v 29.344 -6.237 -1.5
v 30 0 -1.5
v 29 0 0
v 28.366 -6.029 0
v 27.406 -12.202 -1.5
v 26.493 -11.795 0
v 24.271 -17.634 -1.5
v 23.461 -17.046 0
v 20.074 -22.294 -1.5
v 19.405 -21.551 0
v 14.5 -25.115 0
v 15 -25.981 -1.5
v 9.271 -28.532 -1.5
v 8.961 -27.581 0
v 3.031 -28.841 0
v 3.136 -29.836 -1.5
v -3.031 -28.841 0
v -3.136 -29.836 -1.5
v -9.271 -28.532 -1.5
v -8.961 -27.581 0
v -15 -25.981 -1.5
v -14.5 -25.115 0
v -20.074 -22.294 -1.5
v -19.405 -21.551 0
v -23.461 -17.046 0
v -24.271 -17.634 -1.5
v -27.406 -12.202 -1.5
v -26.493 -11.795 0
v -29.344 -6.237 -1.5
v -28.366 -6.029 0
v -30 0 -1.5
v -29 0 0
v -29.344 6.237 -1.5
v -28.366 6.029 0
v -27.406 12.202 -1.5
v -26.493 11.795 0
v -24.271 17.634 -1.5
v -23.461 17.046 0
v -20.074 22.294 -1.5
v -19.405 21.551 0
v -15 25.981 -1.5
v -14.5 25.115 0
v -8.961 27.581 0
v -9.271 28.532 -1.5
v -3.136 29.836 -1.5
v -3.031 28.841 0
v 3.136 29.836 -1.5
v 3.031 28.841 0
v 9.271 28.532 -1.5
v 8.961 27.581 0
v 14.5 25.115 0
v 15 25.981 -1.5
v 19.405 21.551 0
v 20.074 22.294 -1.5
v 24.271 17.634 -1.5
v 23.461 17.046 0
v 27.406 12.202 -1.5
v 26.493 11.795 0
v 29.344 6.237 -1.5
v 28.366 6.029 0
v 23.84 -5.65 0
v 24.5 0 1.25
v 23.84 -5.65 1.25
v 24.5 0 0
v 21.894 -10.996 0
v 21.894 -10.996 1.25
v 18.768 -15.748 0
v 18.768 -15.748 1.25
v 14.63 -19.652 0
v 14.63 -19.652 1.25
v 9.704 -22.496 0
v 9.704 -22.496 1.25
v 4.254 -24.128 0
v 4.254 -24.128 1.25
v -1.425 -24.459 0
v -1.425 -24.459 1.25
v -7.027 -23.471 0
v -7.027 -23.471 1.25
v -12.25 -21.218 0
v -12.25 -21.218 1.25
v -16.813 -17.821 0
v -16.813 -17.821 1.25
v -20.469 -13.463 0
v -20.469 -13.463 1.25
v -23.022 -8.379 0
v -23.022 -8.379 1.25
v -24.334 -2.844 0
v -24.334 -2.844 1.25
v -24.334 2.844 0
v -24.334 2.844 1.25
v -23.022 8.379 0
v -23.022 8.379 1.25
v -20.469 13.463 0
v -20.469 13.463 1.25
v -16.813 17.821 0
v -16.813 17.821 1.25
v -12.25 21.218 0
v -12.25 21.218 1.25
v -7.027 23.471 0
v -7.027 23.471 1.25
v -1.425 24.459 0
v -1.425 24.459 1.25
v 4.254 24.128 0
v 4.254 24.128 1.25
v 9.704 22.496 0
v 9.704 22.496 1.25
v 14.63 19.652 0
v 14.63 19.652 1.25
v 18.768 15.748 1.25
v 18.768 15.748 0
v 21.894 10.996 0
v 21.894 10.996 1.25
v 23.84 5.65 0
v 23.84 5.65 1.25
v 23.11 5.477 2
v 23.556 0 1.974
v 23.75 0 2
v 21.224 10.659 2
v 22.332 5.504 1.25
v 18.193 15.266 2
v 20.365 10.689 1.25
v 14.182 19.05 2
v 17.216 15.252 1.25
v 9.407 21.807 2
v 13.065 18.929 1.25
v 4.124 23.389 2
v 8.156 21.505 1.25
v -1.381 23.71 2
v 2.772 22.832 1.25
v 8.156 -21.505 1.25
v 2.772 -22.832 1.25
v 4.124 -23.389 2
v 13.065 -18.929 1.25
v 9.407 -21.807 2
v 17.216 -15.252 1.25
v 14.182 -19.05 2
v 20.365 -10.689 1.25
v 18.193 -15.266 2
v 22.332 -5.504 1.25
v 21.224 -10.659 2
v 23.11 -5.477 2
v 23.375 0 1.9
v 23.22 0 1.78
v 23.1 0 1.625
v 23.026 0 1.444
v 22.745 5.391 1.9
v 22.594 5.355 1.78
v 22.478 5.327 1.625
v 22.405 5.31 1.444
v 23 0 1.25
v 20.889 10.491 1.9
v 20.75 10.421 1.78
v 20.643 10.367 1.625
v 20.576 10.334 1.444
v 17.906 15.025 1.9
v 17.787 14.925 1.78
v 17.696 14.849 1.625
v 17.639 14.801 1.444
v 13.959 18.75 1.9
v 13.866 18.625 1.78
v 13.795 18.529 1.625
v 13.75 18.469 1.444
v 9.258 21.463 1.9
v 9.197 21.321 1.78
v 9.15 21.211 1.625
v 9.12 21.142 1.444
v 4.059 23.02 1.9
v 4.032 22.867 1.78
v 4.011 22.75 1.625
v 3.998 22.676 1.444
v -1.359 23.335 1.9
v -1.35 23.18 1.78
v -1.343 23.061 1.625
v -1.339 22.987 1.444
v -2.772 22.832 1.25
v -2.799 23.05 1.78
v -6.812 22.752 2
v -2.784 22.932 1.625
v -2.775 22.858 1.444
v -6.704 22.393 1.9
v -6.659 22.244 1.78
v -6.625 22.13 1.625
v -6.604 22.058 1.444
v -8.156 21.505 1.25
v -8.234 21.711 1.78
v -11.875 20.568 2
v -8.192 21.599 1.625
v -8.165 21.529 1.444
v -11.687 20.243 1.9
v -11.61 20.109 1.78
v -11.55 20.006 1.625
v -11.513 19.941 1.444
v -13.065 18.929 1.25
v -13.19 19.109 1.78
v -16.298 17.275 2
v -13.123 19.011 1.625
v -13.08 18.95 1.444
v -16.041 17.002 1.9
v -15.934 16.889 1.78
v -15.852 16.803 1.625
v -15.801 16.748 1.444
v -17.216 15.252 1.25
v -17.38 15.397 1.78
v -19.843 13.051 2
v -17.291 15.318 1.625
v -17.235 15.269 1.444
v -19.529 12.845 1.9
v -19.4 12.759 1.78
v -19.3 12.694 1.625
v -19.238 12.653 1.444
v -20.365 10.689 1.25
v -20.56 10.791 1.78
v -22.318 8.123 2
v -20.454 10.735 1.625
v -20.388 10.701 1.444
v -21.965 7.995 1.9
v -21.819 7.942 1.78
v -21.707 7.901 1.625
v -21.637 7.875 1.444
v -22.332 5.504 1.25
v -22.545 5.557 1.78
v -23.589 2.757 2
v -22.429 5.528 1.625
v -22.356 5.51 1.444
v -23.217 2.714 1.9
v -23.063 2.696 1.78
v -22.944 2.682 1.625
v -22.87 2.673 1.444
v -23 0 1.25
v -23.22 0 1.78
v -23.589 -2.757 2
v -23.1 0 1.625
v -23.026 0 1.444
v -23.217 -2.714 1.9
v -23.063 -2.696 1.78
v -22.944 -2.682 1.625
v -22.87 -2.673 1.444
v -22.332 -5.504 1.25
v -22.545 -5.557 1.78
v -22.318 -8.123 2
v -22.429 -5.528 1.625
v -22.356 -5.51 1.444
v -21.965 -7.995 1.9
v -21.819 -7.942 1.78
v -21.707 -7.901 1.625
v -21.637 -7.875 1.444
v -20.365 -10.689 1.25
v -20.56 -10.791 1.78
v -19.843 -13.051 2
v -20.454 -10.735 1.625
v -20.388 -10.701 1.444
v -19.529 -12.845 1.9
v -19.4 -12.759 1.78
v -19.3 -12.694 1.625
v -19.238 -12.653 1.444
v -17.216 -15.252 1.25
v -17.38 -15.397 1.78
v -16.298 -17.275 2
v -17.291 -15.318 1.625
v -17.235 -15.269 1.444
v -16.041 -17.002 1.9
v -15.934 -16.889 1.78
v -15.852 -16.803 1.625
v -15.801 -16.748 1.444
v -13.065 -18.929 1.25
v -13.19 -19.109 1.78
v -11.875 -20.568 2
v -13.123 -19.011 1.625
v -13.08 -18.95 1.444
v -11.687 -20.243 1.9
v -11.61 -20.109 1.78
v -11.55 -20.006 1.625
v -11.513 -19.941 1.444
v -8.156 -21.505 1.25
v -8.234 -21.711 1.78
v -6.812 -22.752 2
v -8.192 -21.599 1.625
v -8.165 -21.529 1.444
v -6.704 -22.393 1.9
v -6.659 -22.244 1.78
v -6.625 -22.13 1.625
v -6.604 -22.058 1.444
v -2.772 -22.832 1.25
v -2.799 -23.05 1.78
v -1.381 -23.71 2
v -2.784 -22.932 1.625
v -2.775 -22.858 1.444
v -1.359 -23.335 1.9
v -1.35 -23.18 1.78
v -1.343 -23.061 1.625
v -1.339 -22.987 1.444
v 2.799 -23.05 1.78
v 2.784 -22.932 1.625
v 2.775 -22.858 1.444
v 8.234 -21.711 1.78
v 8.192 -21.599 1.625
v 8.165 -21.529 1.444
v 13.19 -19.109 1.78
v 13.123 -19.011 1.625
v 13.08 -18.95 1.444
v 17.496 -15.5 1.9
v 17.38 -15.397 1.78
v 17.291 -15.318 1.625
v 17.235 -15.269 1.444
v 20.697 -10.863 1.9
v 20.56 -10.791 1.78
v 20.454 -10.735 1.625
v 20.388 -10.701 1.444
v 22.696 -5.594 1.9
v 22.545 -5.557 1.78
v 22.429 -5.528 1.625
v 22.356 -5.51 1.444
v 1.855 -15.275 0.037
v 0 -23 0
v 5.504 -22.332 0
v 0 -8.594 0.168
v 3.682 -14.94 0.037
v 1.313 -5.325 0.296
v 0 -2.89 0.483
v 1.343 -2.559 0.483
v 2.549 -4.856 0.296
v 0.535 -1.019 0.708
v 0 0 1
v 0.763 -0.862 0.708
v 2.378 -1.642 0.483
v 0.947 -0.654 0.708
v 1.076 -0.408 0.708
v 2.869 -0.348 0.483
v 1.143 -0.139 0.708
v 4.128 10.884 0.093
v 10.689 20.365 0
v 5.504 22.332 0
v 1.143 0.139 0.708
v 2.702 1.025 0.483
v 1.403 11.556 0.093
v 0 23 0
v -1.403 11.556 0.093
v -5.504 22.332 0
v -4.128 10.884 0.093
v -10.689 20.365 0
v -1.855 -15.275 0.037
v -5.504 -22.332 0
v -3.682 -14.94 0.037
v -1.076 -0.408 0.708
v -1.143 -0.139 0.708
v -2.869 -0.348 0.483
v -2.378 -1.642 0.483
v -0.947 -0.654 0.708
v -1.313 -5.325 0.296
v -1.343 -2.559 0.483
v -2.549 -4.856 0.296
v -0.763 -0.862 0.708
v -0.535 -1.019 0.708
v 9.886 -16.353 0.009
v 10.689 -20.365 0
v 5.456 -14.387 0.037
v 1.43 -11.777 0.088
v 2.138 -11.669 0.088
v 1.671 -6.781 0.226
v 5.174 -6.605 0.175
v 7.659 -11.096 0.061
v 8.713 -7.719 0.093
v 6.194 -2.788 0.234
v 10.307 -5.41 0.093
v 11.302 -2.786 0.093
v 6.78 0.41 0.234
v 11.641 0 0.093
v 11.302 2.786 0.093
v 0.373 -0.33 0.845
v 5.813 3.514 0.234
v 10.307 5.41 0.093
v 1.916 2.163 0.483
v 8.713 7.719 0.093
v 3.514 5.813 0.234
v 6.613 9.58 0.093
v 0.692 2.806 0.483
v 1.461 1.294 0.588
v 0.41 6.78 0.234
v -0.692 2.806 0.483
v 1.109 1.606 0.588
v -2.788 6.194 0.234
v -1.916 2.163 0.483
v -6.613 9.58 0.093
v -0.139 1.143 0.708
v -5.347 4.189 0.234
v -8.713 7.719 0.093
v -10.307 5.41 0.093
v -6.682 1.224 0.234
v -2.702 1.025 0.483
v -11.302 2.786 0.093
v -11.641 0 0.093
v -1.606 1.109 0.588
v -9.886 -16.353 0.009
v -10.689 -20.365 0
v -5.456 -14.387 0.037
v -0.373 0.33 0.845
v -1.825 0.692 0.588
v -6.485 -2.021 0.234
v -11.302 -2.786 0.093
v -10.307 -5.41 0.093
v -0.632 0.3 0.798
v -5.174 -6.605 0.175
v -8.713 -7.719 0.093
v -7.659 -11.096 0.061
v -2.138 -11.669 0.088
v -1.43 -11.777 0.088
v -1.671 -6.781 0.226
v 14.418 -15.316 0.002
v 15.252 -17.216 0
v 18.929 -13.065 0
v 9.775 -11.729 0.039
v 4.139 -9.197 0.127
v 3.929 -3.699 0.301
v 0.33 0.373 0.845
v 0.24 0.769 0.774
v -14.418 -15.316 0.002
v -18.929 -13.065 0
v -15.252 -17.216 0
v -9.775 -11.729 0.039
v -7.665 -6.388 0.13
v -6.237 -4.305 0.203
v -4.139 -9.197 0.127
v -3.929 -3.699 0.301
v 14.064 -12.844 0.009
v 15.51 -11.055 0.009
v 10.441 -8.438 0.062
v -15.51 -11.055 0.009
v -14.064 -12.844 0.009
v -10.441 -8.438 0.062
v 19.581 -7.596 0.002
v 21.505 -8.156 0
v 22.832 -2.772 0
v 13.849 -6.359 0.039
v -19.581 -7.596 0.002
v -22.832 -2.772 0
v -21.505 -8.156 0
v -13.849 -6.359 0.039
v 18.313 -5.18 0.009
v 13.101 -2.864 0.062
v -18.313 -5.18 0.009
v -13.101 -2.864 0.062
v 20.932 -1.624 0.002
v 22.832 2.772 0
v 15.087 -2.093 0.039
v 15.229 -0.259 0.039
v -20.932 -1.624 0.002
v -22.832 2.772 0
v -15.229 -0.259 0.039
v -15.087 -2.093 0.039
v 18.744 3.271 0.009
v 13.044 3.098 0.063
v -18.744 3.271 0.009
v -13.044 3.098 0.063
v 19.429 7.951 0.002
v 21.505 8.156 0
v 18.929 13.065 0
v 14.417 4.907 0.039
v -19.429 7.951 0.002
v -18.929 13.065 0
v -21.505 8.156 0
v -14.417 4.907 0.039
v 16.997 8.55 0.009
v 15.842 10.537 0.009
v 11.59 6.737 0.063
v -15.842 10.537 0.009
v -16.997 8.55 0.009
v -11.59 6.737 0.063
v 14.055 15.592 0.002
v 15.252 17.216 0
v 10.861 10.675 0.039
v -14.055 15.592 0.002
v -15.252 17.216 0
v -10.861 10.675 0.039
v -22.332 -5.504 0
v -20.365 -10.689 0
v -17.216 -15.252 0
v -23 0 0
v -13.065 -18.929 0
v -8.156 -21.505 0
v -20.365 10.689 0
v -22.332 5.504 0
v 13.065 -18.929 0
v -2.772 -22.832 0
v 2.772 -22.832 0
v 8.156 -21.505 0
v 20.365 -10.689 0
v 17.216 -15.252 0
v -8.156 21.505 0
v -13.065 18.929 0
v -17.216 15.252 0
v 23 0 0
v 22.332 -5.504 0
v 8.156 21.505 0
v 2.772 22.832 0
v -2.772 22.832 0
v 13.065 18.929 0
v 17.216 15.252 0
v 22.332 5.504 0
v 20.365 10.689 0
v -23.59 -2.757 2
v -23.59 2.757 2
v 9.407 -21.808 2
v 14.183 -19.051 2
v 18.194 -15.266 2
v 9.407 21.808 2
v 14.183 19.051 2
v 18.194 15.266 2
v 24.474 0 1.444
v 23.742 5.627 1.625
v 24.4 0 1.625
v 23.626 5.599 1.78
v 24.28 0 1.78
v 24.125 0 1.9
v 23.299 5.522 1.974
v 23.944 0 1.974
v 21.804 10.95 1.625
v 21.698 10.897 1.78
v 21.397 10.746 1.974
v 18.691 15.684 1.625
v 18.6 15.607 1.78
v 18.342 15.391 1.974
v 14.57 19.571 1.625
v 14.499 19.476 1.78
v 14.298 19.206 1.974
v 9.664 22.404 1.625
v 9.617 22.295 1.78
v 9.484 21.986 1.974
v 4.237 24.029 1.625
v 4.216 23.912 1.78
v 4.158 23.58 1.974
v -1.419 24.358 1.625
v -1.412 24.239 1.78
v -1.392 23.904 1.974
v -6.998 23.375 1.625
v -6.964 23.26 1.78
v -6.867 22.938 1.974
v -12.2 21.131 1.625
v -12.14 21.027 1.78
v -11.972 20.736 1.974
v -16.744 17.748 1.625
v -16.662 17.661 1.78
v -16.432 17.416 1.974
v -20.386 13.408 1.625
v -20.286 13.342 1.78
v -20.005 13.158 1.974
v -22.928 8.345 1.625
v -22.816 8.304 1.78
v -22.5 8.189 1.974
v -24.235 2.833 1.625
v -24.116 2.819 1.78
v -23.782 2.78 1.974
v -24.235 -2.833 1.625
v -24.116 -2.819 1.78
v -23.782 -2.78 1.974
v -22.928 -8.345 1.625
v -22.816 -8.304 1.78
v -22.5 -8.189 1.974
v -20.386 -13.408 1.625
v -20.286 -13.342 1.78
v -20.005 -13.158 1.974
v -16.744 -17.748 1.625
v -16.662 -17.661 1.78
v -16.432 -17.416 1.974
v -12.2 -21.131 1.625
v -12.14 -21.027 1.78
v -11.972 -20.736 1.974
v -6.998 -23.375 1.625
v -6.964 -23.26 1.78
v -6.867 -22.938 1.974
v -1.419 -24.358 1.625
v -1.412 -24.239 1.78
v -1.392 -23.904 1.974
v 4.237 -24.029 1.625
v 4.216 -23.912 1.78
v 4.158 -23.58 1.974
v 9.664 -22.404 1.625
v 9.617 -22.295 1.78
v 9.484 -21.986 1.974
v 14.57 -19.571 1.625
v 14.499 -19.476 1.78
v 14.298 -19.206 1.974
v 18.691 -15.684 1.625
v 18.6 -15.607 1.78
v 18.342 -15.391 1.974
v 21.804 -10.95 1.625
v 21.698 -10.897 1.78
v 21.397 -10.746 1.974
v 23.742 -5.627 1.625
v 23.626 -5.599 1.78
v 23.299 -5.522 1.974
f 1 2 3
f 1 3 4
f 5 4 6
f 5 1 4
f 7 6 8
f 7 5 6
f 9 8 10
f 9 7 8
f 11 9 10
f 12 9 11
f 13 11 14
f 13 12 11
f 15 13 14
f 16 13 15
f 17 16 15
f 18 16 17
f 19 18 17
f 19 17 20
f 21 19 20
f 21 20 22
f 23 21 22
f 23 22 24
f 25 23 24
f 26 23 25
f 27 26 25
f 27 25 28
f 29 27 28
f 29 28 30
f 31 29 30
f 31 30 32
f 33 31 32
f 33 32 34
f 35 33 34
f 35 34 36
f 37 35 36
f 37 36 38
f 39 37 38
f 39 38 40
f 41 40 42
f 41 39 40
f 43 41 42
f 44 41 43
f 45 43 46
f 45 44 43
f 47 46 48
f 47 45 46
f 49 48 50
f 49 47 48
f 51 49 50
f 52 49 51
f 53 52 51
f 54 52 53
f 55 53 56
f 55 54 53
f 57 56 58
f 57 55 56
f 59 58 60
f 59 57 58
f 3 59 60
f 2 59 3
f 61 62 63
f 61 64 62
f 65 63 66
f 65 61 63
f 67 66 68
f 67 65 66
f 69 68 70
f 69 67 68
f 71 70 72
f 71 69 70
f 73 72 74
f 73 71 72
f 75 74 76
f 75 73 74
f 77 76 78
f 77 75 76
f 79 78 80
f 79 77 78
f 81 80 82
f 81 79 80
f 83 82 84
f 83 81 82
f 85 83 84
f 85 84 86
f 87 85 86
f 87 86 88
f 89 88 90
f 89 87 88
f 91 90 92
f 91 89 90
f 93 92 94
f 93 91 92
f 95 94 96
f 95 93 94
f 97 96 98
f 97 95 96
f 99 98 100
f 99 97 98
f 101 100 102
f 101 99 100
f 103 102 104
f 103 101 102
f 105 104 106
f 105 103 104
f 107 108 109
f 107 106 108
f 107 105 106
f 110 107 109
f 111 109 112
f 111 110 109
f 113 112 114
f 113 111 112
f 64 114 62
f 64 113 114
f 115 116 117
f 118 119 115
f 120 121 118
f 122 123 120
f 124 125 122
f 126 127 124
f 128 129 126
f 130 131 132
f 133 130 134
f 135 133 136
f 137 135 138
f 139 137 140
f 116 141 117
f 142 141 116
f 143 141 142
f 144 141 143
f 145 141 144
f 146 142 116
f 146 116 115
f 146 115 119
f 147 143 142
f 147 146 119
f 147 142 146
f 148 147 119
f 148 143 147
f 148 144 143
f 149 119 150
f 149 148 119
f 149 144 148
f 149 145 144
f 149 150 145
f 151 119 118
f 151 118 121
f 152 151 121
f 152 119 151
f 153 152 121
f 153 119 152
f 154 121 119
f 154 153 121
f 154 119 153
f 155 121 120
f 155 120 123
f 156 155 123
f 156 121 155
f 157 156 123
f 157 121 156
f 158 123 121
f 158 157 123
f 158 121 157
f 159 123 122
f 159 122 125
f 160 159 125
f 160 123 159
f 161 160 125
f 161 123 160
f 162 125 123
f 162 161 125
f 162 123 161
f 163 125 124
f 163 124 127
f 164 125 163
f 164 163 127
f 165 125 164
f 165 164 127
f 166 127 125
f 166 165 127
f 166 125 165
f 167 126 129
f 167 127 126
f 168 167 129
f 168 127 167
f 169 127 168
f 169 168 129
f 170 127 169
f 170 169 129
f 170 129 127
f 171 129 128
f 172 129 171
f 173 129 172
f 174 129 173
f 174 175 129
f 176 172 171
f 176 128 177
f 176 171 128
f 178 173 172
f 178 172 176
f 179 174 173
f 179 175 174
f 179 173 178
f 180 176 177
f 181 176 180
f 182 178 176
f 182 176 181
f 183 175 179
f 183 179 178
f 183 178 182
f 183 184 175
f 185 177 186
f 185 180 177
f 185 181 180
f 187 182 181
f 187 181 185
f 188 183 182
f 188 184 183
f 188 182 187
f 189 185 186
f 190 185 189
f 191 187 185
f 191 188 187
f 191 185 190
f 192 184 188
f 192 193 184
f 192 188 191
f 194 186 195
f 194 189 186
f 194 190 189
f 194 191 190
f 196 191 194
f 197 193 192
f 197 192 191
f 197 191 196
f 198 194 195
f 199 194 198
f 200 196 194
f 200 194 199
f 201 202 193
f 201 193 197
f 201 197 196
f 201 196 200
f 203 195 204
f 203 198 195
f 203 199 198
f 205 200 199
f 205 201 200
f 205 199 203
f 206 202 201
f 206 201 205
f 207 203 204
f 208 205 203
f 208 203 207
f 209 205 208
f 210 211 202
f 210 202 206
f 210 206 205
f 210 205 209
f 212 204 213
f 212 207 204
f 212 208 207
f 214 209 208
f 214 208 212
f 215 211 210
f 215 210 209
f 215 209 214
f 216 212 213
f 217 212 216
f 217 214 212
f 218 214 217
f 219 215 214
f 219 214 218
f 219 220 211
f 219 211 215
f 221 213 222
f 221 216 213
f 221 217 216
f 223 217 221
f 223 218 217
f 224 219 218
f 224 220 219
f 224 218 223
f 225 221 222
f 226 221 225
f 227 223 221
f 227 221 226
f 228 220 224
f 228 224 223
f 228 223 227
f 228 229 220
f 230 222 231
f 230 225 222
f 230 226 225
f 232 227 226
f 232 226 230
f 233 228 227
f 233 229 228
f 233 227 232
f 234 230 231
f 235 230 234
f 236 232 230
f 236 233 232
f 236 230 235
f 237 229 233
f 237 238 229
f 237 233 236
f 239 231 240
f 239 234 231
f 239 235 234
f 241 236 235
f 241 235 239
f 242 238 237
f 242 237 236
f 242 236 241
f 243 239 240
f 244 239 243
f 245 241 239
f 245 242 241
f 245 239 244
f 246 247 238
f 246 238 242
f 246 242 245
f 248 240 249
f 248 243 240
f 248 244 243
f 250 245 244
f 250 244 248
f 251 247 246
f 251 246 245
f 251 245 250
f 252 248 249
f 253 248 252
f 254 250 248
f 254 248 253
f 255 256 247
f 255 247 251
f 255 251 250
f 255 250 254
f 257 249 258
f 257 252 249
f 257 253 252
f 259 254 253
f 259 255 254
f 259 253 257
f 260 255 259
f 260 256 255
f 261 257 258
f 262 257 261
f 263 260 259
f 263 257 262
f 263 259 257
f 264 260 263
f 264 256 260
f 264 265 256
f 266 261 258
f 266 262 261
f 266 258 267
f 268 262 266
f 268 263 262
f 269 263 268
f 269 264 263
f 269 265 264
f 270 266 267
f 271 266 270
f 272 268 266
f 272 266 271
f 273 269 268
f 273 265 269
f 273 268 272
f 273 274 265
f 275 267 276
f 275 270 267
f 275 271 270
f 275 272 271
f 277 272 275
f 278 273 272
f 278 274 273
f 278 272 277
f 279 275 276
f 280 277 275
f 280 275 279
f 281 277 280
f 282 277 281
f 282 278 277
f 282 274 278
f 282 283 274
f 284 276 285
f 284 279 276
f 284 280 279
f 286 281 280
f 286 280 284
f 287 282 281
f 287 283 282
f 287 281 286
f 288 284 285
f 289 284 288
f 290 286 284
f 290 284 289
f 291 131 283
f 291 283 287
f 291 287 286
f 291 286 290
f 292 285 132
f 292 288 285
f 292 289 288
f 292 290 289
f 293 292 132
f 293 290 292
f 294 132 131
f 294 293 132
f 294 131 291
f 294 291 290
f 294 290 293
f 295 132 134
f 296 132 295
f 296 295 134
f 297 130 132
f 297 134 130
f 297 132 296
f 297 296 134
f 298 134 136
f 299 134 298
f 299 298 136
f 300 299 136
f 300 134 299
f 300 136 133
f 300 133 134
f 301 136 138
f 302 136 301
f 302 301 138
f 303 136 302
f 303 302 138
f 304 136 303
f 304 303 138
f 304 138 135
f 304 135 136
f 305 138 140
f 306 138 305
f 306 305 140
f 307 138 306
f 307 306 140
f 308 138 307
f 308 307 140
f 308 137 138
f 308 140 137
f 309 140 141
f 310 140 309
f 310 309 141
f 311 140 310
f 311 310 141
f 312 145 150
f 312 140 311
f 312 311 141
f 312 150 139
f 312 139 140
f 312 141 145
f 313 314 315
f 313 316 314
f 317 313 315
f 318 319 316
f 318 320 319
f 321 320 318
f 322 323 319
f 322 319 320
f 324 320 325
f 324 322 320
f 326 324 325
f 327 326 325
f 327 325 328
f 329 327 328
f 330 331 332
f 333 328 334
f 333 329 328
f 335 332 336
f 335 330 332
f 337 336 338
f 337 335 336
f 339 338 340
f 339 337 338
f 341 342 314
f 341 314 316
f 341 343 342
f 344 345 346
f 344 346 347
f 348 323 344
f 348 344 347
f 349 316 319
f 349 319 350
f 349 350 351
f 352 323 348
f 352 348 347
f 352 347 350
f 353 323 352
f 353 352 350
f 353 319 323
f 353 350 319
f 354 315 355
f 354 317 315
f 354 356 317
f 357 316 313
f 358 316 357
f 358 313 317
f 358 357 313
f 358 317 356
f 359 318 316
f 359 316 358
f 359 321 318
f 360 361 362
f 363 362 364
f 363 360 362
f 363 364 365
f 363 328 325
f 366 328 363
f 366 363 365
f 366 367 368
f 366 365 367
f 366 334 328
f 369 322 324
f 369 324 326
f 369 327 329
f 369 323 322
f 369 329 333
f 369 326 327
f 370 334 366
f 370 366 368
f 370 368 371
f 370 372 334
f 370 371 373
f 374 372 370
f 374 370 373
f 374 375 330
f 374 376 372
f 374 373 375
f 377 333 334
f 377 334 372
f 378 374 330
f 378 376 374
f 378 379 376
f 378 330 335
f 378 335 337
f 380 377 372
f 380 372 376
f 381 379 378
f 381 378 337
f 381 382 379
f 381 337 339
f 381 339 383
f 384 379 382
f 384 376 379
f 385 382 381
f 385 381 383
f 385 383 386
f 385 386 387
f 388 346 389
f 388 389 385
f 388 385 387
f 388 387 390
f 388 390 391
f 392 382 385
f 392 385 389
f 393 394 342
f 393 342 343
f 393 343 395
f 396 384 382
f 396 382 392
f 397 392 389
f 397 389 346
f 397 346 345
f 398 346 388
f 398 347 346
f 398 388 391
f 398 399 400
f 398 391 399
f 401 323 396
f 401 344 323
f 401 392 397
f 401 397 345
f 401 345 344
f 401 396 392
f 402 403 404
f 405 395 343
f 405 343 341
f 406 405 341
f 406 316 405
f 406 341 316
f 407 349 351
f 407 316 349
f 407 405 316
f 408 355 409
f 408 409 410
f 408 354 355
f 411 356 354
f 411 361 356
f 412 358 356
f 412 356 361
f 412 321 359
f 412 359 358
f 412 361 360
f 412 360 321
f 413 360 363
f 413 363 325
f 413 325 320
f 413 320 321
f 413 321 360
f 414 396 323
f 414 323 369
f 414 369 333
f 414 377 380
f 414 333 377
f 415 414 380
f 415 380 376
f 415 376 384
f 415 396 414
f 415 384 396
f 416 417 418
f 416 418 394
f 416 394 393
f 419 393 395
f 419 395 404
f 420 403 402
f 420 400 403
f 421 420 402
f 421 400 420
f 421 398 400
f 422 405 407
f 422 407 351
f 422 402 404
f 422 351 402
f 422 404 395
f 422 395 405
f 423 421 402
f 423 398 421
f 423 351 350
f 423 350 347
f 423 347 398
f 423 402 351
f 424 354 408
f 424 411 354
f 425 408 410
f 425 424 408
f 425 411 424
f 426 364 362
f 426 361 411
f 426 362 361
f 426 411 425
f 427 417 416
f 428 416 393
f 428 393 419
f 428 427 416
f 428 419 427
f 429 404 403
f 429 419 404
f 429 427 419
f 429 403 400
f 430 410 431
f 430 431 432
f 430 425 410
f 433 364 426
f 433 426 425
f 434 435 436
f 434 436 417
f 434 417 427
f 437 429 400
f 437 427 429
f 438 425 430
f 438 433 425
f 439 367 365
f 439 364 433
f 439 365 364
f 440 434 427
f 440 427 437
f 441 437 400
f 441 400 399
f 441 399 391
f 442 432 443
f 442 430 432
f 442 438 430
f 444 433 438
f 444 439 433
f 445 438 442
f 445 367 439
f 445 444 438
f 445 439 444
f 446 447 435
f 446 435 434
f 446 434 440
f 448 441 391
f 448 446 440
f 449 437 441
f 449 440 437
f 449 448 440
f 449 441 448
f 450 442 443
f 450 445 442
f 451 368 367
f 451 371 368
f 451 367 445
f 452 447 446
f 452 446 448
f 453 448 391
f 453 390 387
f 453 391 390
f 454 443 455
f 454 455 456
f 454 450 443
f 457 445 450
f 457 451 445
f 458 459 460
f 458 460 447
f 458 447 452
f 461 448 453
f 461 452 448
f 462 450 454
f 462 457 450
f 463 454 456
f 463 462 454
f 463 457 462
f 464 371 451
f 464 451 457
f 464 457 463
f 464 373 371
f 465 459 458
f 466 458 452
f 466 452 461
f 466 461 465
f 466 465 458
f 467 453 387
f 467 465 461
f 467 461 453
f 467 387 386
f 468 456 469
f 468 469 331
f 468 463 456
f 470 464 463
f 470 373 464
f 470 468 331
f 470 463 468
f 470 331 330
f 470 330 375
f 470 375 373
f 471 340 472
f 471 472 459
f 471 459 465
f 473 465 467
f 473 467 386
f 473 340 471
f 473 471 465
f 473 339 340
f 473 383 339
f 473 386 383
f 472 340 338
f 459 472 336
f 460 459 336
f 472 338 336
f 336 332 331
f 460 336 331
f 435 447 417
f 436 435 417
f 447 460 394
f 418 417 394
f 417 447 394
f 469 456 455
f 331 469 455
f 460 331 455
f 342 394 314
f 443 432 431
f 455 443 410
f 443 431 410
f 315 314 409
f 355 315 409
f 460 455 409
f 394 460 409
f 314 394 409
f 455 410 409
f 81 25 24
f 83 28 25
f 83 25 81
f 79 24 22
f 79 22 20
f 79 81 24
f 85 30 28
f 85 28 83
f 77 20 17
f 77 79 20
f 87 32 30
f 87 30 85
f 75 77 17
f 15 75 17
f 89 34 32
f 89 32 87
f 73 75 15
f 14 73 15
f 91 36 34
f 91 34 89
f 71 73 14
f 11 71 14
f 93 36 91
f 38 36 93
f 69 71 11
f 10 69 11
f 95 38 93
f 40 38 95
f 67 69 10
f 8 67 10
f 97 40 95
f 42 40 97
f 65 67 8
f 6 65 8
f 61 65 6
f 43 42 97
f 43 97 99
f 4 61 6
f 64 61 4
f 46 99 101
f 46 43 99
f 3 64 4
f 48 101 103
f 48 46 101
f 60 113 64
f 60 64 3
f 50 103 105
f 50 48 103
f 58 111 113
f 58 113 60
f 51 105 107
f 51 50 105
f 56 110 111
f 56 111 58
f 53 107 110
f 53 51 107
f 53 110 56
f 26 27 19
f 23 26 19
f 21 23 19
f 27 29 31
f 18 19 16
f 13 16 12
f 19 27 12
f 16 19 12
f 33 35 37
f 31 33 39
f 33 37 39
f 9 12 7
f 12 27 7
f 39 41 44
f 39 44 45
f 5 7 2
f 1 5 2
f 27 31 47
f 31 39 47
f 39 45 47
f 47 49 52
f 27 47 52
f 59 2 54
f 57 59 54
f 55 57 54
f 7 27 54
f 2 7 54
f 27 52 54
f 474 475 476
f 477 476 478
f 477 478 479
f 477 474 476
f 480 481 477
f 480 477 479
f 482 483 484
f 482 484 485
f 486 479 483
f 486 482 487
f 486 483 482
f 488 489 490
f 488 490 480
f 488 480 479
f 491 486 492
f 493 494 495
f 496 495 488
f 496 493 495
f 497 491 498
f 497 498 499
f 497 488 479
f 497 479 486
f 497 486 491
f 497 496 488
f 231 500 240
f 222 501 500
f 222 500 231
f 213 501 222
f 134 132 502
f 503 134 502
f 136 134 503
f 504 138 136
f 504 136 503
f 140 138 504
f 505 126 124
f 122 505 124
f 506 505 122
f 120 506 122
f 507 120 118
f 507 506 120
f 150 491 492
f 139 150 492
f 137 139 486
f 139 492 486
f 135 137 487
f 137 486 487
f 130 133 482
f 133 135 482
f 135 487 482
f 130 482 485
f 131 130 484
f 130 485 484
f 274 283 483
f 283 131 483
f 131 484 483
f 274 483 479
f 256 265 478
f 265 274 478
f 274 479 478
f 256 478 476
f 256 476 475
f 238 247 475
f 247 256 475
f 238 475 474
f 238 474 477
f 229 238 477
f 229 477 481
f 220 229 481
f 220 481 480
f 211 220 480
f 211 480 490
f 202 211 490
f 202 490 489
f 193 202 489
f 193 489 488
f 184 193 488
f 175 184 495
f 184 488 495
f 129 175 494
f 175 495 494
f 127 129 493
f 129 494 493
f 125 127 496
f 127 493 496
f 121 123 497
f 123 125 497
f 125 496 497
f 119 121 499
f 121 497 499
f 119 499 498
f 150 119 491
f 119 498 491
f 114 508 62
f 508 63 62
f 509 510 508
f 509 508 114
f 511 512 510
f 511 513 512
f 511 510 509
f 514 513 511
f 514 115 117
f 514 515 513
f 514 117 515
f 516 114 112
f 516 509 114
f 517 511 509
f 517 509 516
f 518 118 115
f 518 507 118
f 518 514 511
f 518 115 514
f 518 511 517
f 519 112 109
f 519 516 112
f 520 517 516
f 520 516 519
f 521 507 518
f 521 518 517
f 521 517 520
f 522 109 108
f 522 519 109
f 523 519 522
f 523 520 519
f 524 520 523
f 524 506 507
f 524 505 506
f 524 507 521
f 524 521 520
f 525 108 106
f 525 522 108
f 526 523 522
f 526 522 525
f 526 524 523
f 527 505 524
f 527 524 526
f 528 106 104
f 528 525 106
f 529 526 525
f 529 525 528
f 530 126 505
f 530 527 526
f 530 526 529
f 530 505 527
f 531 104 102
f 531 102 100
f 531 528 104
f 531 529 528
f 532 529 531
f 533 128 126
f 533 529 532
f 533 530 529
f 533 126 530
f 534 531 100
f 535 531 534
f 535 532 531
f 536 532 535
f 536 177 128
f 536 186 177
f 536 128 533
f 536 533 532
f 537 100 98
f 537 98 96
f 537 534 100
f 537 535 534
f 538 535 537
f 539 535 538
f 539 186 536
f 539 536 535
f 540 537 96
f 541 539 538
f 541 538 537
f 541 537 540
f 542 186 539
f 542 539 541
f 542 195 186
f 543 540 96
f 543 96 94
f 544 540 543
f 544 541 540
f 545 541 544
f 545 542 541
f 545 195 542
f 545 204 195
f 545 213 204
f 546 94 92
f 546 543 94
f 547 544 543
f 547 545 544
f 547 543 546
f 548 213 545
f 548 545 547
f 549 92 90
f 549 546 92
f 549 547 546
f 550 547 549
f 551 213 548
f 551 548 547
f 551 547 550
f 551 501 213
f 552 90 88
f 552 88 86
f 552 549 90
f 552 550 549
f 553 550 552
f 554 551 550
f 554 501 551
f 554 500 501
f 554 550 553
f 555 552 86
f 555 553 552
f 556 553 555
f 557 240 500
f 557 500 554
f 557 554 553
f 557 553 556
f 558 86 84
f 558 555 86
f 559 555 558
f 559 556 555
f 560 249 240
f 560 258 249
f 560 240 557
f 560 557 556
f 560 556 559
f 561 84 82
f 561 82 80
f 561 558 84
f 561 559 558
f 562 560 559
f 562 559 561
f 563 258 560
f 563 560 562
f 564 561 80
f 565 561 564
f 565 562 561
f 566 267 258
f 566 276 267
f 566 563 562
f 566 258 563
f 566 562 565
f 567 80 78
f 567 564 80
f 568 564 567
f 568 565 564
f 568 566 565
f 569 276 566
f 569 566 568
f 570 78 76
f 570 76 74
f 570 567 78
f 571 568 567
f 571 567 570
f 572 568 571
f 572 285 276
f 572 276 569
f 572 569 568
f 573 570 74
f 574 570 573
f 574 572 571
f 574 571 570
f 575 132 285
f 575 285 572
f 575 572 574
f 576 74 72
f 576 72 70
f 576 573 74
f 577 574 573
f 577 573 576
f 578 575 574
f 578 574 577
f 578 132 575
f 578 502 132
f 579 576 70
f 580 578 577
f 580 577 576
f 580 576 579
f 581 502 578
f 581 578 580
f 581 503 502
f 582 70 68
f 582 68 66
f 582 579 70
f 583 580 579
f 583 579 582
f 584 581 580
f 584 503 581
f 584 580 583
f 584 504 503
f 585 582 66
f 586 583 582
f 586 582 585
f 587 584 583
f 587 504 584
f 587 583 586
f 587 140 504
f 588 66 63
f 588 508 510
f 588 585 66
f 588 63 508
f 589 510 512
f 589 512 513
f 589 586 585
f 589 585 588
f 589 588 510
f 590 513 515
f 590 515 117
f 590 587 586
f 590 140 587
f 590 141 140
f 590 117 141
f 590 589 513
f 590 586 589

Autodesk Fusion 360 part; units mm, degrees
sketch "Bottom" plane through (0, 0, 0) normal (0, 0, 1) x (1, 0, 0)
  circle A0 centre (0, 0) radius 29
  circle A1 centre (0, 0) radius 24.5
  circle A2 centre (0, 0) radius 23
  dimension "d1" = 58
  dimension "d2" = 49
  dimension "d3" = 46
ref_plane "WorkPlane1" through (0, 0, -1.5) normal (0, 0, 1) x (1, 0, 0)
sketch "Top" plane through (0, 0, -1.5) normal (0, 0, 1) x (1, 0, 0)
  circle A0 centre (0, 0) radius 30
  dimension "d5" = 60
extrude "Extrude1" add sketch "Bottom" along normal blind 2 contours A1 makes body 1
loft "Loft1" add profiles "Bottom", "Top" section 1 contours A0 section 2 bodies 1
fillet "Fillet1" radius 0.75 1 faces at (23.8232, -2.3598, 2) on bodies 1
sketch "Center cone" plane through (0, 0, 0) normal (1, 0, 0) x (0, 1, 0)
  spline S0 degree 5 poles (-23, 0) (-21.7292, 0) (-19.2285, 0.0046) (-15.5997, 0.0254) (-11.0228, 0.0831) (-5.9509, 0.2293) (-2.74, 0.4428) (-1.0472, 0.6846) (-0.2875, 0.8878) (0, 1) knots 0 0 0 0 0 0 0.2 0.4 0.6 0.8 1 1 1 1 1 1
  line L0 (-0.7141, 0.7214) -> (0.7141, 1.2786)
  line L1 (0, 1) -> (0, 0)
  line L2 (0, 0) -> (-23, 0)
revolve "Revolve1" add sketch "Center cone" angle 360 about axis through (0, 0, 1.75) along (0, 0, 1) separate body makes body 2
